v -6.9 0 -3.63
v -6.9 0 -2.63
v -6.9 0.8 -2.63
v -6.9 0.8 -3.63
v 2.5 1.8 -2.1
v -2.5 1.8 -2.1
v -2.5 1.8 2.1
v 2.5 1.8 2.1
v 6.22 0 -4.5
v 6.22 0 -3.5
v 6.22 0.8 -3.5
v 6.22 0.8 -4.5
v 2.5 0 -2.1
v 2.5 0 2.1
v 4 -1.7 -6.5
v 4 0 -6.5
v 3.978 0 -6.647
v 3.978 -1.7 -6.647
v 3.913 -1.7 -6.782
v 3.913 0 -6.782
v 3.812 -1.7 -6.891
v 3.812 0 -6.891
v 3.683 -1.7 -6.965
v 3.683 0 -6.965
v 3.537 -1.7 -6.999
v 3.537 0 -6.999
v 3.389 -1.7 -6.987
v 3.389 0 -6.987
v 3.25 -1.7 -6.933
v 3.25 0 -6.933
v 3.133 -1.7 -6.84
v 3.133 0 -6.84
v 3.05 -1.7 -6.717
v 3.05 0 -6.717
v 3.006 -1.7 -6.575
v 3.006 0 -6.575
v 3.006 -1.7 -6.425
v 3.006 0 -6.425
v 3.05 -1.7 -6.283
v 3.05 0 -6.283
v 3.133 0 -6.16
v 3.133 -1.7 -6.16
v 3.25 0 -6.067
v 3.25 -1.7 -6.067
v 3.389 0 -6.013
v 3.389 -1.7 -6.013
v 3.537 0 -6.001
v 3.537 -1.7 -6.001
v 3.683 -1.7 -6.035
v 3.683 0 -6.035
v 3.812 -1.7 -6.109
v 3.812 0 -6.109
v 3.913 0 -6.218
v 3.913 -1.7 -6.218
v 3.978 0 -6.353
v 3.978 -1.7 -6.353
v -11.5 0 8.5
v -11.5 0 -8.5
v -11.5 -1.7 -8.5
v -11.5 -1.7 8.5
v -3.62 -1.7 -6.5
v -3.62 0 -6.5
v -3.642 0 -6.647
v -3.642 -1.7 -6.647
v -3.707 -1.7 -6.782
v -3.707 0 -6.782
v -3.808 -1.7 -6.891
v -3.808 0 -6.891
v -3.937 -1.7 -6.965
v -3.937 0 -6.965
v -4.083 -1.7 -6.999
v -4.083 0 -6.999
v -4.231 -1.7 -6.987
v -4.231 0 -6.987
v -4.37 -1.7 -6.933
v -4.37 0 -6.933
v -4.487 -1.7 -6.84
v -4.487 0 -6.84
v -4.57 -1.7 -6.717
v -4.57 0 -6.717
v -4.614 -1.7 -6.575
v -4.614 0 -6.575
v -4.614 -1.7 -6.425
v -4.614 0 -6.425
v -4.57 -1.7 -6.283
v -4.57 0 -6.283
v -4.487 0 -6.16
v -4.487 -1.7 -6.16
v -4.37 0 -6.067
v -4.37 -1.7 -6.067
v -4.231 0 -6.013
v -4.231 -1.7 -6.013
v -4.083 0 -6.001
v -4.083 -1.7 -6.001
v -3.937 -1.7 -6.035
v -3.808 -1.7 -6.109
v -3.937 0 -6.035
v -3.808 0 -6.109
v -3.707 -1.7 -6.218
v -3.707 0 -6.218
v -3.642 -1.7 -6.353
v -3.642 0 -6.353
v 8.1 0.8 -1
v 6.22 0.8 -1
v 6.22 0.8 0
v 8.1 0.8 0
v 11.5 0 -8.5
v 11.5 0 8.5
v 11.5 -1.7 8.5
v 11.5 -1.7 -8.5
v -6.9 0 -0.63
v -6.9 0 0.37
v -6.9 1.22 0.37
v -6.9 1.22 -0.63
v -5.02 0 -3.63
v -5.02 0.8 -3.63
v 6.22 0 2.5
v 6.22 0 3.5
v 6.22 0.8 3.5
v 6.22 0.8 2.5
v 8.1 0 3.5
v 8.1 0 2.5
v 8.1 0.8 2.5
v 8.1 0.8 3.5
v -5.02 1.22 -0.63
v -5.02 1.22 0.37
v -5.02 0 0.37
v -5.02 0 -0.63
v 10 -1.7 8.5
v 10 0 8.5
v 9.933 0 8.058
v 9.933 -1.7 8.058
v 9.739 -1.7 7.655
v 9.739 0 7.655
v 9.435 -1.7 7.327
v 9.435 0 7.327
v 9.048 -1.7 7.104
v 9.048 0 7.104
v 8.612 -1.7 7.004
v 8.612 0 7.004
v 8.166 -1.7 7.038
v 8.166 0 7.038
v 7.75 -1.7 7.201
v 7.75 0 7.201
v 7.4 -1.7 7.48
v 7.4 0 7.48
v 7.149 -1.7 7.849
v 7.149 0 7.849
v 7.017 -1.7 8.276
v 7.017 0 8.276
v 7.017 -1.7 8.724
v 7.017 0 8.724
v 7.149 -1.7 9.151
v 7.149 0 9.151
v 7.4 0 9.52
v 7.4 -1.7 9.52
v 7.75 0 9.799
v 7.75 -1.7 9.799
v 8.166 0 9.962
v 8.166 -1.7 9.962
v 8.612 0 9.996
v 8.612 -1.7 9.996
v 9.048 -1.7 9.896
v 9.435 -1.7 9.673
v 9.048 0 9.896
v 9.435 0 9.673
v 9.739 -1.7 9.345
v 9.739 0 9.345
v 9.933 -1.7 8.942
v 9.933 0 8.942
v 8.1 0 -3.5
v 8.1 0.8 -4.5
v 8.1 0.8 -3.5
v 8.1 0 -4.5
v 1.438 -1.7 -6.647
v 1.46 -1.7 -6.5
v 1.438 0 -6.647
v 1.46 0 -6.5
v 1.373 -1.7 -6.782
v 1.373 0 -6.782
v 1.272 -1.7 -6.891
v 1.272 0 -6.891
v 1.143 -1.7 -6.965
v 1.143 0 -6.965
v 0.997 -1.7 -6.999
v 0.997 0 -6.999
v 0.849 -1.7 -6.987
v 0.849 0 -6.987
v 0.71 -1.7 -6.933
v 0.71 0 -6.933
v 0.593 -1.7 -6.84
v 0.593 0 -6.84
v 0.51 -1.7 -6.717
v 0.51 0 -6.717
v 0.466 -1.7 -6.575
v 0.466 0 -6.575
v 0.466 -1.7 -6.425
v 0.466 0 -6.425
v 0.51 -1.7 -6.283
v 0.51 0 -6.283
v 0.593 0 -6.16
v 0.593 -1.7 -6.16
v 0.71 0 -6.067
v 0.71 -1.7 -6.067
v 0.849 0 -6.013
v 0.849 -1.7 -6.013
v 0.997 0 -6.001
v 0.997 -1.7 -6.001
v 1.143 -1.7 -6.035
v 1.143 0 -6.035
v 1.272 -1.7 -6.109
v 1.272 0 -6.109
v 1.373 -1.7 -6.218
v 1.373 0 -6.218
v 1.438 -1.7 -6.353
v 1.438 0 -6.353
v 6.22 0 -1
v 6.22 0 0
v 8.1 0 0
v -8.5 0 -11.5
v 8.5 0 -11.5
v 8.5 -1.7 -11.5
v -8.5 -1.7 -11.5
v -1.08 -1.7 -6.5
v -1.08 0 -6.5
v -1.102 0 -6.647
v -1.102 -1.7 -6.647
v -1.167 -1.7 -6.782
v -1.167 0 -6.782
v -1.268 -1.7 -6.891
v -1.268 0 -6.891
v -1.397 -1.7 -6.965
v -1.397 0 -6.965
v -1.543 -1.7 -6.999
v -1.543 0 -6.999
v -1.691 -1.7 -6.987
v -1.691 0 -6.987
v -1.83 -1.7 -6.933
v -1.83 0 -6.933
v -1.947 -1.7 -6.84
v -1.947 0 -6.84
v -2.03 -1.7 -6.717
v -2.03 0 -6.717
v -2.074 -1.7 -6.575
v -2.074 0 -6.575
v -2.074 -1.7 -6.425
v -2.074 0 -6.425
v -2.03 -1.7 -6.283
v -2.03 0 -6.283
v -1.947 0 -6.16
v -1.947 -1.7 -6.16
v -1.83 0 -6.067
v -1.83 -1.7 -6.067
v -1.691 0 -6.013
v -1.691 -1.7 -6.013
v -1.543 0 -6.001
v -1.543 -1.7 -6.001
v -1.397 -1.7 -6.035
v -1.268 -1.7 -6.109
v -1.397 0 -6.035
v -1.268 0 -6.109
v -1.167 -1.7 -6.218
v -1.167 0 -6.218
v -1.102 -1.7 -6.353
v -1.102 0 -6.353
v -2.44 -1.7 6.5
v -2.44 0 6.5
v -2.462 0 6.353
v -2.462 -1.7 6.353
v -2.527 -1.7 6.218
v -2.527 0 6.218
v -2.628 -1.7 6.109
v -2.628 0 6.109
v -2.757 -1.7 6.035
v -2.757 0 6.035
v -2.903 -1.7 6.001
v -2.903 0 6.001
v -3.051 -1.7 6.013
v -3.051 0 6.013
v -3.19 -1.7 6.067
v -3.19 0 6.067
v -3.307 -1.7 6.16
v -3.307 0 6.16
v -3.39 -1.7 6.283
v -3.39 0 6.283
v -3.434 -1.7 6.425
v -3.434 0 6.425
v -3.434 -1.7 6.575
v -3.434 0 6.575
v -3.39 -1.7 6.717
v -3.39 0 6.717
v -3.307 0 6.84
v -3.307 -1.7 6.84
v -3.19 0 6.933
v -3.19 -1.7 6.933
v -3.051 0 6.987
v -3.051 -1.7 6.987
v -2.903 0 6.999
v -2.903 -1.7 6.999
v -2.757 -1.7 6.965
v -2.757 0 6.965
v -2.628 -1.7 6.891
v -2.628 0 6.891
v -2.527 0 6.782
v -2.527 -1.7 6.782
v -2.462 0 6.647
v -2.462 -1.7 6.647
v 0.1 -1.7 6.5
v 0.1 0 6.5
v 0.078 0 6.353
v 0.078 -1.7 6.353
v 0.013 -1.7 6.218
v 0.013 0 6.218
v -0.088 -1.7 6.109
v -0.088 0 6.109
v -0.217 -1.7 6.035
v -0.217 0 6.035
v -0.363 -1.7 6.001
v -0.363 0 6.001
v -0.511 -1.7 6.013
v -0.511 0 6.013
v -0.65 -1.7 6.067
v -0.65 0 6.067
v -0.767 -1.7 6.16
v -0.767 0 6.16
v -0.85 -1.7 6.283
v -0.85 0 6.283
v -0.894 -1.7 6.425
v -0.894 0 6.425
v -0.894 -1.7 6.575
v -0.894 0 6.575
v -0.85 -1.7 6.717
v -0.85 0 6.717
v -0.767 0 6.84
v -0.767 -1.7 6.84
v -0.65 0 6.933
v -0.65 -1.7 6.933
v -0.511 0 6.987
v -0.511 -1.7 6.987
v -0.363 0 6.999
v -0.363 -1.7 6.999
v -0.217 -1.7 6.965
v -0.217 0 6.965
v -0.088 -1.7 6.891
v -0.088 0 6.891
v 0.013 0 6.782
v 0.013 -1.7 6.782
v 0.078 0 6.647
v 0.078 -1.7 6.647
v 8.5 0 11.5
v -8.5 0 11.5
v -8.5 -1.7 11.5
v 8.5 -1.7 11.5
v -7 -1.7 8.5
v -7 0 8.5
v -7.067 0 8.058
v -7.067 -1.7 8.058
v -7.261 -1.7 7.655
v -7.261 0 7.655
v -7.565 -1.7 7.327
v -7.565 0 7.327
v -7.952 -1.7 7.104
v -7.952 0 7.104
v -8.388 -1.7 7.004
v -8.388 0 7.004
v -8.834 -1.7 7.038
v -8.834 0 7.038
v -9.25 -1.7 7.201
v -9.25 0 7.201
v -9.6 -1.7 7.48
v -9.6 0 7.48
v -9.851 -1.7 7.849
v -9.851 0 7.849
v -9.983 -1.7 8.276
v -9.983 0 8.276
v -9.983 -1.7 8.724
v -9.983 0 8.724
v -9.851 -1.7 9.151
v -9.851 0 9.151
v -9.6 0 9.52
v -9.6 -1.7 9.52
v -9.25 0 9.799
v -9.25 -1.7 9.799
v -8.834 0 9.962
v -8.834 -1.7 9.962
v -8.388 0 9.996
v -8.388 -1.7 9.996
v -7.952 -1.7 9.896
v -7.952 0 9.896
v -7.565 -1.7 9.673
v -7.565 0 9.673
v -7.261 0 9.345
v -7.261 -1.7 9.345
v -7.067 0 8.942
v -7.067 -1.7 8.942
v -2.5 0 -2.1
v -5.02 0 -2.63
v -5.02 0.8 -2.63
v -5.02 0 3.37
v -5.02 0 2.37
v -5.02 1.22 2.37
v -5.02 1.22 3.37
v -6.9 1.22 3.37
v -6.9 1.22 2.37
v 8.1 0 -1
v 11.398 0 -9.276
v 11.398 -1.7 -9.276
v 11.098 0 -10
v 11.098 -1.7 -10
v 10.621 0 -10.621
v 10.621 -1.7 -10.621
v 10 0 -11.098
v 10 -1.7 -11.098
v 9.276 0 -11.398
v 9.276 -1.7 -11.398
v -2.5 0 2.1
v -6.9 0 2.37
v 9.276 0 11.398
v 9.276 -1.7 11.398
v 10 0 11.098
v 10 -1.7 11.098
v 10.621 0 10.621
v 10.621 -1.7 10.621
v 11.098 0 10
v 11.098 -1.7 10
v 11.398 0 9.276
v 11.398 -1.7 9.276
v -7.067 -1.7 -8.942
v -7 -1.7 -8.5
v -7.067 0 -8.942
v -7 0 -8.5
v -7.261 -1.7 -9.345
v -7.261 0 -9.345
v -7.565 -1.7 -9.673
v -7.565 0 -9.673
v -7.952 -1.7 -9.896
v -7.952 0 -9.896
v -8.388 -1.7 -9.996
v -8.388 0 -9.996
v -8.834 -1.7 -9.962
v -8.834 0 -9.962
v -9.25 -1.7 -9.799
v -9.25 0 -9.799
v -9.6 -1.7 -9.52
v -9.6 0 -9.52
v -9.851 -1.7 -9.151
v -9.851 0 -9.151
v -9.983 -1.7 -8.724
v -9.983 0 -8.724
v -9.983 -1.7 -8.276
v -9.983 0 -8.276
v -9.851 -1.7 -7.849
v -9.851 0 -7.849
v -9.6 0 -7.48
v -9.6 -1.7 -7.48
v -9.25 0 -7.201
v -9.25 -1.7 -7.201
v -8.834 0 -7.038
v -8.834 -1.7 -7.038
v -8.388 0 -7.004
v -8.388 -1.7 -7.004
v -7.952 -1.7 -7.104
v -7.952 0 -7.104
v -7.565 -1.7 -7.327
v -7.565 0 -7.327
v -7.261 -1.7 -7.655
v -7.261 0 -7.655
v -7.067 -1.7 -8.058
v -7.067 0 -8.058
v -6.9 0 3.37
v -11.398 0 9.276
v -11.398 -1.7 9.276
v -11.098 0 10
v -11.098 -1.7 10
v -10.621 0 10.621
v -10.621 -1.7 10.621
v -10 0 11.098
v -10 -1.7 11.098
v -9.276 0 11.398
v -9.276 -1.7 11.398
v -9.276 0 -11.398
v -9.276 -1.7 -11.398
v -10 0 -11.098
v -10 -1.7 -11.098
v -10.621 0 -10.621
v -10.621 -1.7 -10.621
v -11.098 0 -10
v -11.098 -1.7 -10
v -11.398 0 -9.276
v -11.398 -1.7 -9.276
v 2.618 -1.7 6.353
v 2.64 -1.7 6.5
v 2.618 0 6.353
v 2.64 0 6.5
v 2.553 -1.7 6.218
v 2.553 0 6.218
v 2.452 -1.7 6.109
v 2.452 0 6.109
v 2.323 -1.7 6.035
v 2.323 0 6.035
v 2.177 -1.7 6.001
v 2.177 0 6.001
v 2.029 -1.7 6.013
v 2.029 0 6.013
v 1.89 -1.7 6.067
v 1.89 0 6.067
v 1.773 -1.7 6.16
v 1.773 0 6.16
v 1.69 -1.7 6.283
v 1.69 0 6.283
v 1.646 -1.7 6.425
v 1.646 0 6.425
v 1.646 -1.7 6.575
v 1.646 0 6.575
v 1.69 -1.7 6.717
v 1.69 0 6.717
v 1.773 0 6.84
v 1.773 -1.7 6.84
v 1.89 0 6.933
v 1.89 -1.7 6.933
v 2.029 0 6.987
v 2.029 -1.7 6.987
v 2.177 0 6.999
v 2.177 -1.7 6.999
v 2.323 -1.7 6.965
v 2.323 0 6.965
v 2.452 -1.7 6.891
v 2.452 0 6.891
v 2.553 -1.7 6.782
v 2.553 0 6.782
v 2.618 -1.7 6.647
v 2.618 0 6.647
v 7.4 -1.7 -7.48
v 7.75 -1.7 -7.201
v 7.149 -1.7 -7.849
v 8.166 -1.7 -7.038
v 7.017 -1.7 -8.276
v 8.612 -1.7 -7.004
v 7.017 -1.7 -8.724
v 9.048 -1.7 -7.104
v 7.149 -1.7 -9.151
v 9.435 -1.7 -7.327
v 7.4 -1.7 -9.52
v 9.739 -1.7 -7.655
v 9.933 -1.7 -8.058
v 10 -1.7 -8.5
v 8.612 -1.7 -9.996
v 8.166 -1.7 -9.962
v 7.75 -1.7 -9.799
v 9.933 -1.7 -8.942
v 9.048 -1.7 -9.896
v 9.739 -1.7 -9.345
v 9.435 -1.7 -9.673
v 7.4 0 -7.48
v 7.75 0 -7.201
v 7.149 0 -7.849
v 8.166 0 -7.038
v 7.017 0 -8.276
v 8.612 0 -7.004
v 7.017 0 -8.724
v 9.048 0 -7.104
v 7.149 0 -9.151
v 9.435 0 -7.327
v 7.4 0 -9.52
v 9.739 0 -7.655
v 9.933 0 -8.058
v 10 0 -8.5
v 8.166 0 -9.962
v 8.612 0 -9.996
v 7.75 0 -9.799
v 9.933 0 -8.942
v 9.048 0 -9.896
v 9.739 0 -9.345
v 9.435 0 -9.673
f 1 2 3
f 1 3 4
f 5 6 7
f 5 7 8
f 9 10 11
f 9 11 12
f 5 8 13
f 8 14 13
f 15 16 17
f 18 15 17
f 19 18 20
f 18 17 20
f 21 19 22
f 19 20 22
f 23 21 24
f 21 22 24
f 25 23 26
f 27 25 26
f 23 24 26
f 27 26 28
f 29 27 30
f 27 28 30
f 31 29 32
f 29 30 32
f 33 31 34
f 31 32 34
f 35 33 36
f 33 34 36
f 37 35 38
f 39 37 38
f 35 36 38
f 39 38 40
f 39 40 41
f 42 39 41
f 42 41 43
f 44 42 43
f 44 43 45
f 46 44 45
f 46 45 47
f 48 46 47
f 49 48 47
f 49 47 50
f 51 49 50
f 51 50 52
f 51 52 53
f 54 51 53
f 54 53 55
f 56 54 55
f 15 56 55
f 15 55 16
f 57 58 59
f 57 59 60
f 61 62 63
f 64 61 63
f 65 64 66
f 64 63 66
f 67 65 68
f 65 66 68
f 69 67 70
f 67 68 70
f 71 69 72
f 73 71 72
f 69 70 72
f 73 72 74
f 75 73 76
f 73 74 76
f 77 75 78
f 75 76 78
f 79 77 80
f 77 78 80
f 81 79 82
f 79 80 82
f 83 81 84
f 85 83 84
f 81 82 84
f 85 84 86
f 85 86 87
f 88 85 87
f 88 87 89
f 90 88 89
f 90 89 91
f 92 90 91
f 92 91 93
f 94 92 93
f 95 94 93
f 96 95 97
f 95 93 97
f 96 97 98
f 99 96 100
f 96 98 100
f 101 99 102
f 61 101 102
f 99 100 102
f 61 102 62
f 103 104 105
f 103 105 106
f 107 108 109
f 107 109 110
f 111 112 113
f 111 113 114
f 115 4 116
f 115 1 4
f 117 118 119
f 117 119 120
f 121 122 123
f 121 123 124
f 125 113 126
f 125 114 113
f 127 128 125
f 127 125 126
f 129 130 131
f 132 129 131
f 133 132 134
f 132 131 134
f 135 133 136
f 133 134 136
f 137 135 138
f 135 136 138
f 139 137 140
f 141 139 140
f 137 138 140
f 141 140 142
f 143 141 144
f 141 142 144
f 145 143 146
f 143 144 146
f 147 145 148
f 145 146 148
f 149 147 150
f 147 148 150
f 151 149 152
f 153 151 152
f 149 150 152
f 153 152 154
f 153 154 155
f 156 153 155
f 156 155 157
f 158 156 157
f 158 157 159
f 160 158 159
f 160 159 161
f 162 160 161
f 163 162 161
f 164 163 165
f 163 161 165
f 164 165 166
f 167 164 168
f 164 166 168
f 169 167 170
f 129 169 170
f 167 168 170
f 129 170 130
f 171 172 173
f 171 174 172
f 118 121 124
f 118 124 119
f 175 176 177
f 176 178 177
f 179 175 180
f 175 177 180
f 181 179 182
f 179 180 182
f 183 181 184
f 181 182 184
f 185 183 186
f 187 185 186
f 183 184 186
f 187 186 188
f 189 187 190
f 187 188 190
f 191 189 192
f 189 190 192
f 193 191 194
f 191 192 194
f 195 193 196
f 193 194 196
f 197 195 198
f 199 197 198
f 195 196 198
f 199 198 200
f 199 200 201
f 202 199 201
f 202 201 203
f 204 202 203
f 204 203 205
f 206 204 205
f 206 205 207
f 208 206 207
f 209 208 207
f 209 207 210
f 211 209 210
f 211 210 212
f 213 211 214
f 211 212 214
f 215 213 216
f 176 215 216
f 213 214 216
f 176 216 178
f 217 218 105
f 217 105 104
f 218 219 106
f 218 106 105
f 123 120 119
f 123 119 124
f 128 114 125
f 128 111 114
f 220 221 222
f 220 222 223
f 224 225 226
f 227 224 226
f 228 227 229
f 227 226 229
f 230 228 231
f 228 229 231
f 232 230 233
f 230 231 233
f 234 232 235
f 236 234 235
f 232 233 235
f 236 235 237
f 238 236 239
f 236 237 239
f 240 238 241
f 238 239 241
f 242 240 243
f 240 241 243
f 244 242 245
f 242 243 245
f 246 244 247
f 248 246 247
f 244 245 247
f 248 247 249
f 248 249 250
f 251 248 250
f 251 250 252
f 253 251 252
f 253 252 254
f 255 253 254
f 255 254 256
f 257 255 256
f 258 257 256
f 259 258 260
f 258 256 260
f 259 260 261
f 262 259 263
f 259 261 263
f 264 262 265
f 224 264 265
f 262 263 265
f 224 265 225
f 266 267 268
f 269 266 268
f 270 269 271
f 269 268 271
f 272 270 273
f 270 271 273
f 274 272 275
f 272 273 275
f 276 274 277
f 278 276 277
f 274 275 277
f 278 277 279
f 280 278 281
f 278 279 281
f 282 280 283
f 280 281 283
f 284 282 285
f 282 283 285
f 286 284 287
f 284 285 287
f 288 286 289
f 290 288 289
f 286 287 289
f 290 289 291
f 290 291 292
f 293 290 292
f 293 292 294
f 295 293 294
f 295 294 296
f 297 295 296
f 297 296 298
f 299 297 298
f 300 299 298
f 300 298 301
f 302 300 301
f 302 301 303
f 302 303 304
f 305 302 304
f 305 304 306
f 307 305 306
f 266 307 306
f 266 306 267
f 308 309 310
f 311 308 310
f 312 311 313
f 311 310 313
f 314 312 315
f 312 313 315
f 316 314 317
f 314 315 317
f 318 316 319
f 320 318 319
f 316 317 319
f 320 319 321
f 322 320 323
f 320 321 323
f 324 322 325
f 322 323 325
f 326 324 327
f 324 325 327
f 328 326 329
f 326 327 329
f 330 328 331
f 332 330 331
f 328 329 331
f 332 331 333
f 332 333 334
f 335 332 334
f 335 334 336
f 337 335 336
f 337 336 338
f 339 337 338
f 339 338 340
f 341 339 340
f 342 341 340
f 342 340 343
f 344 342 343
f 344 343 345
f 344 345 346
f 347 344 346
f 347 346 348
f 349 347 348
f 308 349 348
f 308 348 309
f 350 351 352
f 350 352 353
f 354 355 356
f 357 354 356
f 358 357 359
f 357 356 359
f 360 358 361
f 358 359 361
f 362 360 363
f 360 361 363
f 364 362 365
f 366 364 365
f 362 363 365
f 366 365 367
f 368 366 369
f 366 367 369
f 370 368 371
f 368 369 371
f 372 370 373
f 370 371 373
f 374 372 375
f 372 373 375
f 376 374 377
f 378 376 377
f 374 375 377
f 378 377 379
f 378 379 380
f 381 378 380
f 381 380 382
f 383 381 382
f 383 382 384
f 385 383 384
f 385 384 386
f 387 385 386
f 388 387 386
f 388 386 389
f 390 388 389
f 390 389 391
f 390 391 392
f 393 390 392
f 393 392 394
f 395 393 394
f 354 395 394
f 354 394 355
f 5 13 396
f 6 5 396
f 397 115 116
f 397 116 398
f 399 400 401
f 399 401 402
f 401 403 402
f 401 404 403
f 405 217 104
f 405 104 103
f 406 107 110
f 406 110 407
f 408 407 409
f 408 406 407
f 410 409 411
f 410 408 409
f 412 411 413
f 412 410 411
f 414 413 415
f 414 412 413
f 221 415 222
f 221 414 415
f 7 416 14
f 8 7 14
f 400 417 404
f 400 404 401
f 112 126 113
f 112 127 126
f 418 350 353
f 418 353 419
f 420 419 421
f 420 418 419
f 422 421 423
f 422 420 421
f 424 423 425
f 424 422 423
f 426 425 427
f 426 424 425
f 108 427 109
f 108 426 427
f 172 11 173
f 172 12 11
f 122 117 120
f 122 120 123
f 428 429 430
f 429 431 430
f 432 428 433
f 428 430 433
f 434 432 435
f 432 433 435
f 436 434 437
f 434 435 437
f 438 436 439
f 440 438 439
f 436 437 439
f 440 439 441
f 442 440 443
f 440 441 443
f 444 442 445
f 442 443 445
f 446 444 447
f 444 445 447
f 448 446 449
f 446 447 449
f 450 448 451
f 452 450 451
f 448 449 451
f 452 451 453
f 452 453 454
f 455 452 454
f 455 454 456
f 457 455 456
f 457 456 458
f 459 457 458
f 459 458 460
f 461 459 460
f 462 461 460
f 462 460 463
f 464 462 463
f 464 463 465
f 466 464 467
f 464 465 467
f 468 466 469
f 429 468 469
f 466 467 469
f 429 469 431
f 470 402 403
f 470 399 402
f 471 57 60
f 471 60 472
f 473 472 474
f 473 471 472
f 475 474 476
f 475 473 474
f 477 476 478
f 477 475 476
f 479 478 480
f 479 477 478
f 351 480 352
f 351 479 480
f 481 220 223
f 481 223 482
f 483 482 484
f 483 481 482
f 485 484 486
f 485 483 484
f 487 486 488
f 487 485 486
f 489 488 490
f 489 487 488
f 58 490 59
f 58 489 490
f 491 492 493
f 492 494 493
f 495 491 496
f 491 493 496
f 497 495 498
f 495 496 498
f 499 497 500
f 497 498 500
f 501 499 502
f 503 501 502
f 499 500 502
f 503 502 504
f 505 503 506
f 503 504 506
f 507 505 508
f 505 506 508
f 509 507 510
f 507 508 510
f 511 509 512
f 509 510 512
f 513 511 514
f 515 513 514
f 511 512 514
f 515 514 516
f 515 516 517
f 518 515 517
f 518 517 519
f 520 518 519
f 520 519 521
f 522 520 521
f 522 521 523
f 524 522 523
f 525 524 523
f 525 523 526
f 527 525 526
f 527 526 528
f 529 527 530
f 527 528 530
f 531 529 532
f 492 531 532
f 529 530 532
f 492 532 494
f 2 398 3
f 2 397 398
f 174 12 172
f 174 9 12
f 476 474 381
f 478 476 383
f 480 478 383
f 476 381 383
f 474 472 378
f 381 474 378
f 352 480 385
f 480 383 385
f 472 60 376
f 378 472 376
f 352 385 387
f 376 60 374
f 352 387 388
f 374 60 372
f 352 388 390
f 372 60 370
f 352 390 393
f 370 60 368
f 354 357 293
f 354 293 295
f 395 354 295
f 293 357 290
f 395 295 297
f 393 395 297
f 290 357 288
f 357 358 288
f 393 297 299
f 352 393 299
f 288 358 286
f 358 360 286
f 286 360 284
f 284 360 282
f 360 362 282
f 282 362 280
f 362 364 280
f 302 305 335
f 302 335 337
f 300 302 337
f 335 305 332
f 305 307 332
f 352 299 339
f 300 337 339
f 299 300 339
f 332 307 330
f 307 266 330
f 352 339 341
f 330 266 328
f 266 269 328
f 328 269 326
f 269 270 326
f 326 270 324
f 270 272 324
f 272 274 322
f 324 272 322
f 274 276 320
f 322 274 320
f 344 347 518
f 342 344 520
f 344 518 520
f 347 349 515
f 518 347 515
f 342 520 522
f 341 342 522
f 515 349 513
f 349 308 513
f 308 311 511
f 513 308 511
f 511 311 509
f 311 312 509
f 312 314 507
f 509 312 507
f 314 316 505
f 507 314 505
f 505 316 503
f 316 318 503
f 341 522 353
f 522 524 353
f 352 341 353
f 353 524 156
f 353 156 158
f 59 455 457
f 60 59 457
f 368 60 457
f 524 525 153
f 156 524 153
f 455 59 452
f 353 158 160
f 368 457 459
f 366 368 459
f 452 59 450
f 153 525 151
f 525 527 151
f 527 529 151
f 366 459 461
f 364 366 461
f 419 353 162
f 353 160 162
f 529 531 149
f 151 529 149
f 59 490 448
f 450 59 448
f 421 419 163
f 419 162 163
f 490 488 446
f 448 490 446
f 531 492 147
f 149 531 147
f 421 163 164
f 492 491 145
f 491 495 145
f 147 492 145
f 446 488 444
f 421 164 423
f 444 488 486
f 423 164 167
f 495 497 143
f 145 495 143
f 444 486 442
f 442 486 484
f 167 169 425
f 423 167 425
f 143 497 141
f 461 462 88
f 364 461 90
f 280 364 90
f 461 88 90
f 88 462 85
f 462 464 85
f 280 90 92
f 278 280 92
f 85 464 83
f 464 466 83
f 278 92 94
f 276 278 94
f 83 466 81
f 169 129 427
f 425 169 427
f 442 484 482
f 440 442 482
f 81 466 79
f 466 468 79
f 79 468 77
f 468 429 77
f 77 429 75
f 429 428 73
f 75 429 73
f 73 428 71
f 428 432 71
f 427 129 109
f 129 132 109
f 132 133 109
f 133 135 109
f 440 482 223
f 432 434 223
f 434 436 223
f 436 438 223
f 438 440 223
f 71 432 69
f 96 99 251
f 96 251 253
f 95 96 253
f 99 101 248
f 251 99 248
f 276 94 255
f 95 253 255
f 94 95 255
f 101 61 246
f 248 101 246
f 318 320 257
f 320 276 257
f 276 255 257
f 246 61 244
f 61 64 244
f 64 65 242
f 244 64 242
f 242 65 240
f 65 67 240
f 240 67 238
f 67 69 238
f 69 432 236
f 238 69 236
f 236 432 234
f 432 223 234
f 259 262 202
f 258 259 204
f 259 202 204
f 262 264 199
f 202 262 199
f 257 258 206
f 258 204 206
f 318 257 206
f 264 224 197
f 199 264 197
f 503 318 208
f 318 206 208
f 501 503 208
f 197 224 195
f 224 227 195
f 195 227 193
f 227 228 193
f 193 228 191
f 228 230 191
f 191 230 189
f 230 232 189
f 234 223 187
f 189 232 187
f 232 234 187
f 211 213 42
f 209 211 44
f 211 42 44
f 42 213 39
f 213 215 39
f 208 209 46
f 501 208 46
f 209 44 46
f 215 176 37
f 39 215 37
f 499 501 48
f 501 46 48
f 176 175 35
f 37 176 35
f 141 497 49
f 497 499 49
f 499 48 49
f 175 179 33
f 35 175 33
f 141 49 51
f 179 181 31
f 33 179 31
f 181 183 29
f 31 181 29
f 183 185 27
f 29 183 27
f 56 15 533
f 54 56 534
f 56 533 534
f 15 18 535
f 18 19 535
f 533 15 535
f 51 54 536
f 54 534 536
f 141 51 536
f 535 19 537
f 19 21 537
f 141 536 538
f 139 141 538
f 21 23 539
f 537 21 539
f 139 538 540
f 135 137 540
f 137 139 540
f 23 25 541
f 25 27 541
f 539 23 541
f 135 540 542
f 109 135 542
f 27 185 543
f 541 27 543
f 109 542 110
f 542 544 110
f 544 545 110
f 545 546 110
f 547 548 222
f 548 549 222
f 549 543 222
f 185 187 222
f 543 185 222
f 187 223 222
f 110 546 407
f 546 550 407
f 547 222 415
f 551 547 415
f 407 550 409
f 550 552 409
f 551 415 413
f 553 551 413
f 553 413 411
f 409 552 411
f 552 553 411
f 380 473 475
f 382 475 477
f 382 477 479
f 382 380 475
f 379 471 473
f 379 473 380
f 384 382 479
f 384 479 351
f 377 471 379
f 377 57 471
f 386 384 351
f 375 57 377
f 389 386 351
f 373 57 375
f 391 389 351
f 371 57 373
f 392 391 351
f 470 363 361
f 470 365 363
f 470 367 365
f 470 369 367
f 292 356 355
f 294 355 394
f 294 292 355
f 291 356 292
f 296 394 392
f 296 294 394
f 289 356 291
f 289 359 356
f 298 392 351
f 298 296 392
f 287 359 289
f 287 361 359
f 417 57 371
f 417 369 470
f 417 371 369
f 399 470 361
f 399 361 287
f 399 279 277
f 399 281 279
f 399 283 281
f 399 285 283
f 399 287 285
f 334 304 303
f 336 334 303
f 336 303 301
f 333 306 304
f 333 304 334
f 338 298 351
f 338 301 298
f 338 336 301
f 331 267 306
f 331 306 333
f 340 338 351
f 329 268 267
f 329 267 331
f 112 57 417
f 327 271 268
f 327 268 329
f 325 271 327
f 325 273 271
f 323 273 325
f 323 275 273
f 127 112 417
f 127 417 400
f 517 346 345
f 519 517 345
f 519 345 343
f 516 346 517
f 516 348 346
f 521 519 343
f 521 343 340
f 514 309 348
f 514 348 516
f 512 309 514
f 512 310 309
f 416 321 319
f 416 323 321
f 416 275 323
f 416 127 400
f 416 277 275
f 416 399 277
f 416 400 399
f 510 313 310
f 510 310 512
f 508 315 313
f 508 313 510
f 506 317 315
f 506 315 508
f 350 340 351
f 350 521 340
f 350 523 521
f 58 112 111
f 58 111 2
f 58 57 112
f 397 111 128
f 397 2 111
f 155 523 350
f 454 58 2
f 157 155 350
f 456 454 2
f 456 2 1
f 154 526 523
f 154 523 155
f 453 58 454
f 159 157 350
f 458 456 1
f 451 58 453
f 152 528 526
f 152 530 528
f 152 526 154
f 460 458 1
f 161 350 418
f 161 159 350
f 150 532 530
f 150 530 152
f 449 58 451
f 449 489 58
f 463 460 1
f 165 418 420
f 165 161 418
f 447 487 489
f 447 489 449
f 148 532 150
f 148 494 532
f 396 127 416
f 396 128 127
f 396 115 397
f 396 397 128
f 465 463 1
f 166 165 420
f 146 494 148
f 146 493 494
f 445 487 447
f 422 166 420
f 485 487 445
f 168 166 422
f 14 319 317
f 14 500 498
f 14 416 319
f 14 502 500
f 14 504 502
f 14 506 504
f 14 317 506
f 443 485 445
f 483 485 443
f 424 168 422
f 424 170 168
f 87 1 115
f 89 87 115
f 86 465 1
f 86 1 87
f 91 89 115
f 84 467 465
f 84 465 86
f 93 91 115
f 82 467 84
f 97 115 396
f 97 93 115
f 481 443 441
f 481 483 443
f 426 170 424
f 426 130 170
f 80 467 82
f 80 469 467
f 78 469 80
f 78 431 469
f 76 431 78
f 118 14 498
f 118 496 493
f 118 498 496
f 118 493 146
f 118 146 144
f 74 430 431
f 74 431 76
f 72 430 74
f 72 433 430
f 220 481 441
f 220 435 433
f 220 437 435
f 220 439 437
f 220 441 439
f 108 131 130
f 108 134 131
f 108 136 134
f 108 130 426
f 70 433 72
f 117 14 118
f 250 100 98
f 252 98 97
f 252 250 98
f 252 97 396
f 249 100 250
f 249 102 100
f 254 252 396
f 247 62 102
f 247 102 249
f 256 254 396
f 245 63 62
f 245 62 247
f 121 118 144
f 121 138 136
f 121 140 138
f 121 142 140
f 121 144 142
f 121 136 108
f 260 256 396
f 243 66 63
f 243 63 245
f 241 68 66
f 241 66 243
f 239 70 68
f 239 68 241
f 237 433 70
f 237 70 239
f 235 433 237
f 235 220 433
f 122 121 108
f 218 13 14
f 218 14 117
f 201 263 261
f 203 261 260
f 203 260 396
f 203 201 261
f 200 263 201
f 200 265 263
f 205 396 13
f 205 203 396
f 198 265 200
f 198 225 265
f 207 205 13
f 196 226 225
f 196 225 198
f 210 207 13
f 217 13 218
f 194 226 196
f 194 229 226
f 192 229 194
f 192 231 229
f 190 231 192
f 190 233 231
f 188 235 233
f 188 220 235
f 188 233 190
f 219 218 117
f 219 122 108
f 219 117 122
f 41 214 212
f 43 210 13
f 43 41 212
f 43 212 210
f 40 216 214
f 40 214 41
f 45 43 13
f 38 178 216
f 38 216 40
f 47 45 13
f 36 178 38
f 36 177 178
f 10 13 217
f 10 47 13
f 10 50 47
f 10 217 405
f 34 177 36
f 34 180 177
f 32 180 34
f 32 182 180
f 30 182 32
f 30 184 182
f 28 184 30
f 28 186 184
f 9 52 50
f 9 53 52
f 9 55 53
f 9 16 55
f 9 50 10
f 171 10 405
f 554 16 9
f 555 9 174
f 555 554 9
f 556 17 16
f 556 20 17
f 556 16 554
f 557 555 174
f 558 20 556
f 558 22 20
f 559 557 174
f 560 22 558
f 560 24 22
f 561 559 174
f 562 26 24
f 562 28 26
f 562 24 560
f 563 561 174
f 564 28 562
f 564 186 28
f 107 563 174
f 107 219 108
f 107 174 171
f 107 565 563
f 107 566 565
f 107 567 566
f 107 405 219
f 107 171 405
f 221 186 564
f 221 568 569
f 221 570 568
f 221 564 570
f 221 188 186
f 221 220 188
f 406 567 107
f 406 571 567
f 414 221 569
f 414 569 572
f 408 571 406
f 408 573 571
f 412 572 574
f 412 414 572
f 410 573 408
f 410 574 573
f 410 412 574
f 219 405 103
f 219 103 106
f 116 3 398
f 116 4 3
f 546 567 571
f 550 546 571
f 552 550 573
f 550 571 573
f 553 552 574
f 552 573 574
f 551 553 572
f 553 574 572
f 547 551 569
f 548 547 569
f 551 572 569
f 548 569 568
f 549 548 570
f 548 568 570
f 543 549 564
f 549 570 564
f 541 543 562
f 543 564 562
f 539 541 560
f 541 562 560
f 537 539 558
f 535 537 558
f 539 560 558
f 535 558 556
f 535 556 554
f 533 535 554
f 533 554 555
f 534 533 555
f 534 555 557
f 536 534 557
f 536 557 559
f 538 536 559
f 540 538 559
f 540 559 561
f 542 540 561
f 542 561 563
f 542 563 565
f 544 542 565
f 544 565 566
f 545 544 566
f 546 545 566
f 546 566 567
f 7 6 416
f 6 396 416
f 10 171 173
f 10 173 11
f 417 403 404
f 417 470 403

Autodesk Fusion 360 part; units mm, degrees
sketch "Sketch2" plane through (0, 0, 0) normal (0, 1, 0) x (1, 0, 0)
  line L0 (-8.5, -11.5) -> (8.5, -11.5)
  line L1 (11.5, -8.5) -> (11.5, 8.5)
  line L2 (8.5, 11.5) -> (-8.5, 11.5)
  line L3 (-11.5, 8.5) -> (-11.5, -8.5)
  line L4 (-11.5, -11.5) -> (11.5, 11.5) construction
  line L5 (11.5, -11.5) -> (-11.5, 11.5) construction
  line L6 (-8.5, 8.5) -> (8.5, 8.5) construction
  line L7 (8.5, 8.5) -> (8.5, -8.5) construction
  line L8 (8.5, -8.5) -> (-8.5, -8.5) construction
  line L9 (-8.5, -8.5) -> (-8.5, 8.5) construction
  line L10 (-8.5, 8.5) -> (8.5, -8.5) construction
  line L11 (8.5, 8.5) -> (-8.5, -8.5) construction
  circle A0 centre (-8.5, 8.5) radius 1.5
  circle A1 centre (8.5, 8.5) radius 1.5
  circle A2 centre (8.5, -8.5) radius 1.5
  circle A3 centre (-8.5, -8.5) radius 1.5
  arc A4 (-8.5, 11.5) -> (-11.5, 8.5) centre (-8.5, 8.5) ccw
  arc A5 (11.5, 8.5) -> (8.5, 11.5) centre (8.5, 8.5) ccw
  arc A6 (8.5, -11.5) -> (11.5, -8.5) centre (8.5, -8.5) ccw
  arc A7 (-11.5, -8.5) -> (-8.5, -11.5) centre (-8.5, -8.5) ccw
  line L12 (-2.5, -2.1) -> (2.5, -2.1)
  line L13 (2.5, -2.1) -> (2.5, 2.1)
  line L14 (2.5, 2.1) -> (-2.5, 2.1)
  line L15 (-2.5, 2.1) -> (-2.5, -2.1)
  line L16 (-2.5, -2.1) -> (2.5, 2.1) construction
  line L17 (2.5, -2.1) -> (-2.5, 2.1) construction
  circle A8 centre (-4.12, 6.5) radius 0.5
  circle A9 centre (-1.58, 6.5) radius 0.5
  circle A10 centre (0.96, 6.5) radius 0.5
  circle A11 centre (3.5, 6.5) radius 0.5
  line L18 (-4.12, 6.5) -> (-1.58, 6.5) construction
  line L19 (-1.58, 6.5) -> (0.96, 6.5) construction
  line L20 (0.96, 6.5) -> (3.5, 6.5) construction
  circle A12 centre (2.14, -6.5) radius 0.5
  circle A13 centre (-0.4, -6.5) radius 0.5
  circle A14 centre (-2.94, -6.5) radius 0.5
  line L21 (-2.94, -6.5) -> (-0.4, -6.5) construction
  line L22 (-0.4, -6.5) -> (2.14, -6.5) construction
  line L23 (-6.9, 3.63) -> (-5.02, 3.63)
  line L24 (-5.02, 3.63) -> (-5.02, 2.63)
  line L25 (-5.02, 2.63) -> (-6.9, 2.63)
  line L26 (-6.9, 2.63) -> (-6.9, 3.63)
  line L27 (-6.9, 0.63) -> (-5.02, 0.63)
  line L28 (-5.02, 0.63) -> (-5.02, -0.37)
  line L29 (-5.02, -0.37) -> (-6.9, -0.37)
  line L30 (-6.9, -0.37) -> (-6.9, 0.63)
  line L31 (-6.9, -2.37) -> (-5.02, -2.37)
  line L32 (-5.02, -2.37) -> (-5.02, -3.37)
  line L33 (-5.02, -3.37) -> (-6.9, -3.37)
  line L34 (-6.9, -3.37) -> (-6.9, -2.37)
  line L35 (-6.9, 2.63) -> (-6.9, 0.63) construction
  line L36 (-6.9, -0.37) -> (-6.9, -2.37) construction
  line L37 (6.22, 4.5) -> (8.1, 4.5)
  line L38 (8.1, 4.5) -> (8.1, 3.5)
  line L39 (8.1, 3.5) -> (6.22, 3.5)
  line L40 (6.22, 3.5) -> (6.22, 4.5)
  line L41 (6.22, 1) -> (8.1, 1)
  line L42 (8.1, 1) -> (8.1, 0)
  line L43 (8.1, 0) -> (6.22, 0)
  line L44 (6.22, 0) -> (6.22, 1)
  line L45 (6.22, -2.5) -> (8.1, -2.5)
  line L46 (8.1, -2.5) -> (8.1, -3.5)
  line L47 (8.1, -3.5) -> (6.22, -3.5)
  line L48 (6.22, -3.5) -> (6.22, -2.5)
  line L49 (8.1, -2.5) -> (8.1, 0) construction
  line L50 (8.1, 3.5) -> (8.1, 1) construction
  dimension "d6" = 23
  dimension "d7" = 23
  dimension "d8" = 17
  dimension "d9" = 17
  dimension "d10" = 3
  dimension "d11" = 3
  dimension "d12" = 3
  dimension "d13" = 3
  dimension "d14" = 3
  dimension "d15" = 5
  dimension "d16" = 4.2
  dimension "d21" = 1
  dimension "d25" = 2.54
  dimension "d26" = 2.54
  dimension "d27" = 2.54
  dimension "d28" = 5
  dimension "d29" = 8
  dimension "d30" = 2.54
  dimension "d31" = 2.54
  dimension "d32" = 5
  dimension "d33" = 8.56
  dimension "d34" = 1.88
  dimension "d35" = 1
  dimension "d36" = 2
  dimension "d37" = 2
  dimension "d38" = 4.6
  dimension "d39" = 8.13
  dimension "d41" = 3.4
  dimension "d42" = 2.5
  dimension "d43" = 2.5
  dimension "d44" = 8
extrude "Extrude1" add sketch "Sketch2" against normal blind 1.7 contours L0 L1 L2 L3 A4 A5 A6 A7 | L12 L13 L14 L15 | L23 L24 L25 L26 | L27 L28 L29 L30 | L31 L32 L33 L34 | L37 L38 L39 L40 | L41 L42 L43 L44 | L45 L46 L47 L48
extrude "Extrude2" add sketch "Sketch2" along normal blind 1.8 contours L12 L13 L14 L15
extrude "Extrude3" add sketch "Sketch2" along normal blind 0.8 contours L23 L24 L25 L26 | L37 L38 L39 L40 | L41 L42 L43 L44 | L45 L46 L47 L48
extrude "Extrude4" add sketch "Sketch2" along normal blind 1.22 contours L27 L28 L29 L30 | L31 L32 L33 L34
